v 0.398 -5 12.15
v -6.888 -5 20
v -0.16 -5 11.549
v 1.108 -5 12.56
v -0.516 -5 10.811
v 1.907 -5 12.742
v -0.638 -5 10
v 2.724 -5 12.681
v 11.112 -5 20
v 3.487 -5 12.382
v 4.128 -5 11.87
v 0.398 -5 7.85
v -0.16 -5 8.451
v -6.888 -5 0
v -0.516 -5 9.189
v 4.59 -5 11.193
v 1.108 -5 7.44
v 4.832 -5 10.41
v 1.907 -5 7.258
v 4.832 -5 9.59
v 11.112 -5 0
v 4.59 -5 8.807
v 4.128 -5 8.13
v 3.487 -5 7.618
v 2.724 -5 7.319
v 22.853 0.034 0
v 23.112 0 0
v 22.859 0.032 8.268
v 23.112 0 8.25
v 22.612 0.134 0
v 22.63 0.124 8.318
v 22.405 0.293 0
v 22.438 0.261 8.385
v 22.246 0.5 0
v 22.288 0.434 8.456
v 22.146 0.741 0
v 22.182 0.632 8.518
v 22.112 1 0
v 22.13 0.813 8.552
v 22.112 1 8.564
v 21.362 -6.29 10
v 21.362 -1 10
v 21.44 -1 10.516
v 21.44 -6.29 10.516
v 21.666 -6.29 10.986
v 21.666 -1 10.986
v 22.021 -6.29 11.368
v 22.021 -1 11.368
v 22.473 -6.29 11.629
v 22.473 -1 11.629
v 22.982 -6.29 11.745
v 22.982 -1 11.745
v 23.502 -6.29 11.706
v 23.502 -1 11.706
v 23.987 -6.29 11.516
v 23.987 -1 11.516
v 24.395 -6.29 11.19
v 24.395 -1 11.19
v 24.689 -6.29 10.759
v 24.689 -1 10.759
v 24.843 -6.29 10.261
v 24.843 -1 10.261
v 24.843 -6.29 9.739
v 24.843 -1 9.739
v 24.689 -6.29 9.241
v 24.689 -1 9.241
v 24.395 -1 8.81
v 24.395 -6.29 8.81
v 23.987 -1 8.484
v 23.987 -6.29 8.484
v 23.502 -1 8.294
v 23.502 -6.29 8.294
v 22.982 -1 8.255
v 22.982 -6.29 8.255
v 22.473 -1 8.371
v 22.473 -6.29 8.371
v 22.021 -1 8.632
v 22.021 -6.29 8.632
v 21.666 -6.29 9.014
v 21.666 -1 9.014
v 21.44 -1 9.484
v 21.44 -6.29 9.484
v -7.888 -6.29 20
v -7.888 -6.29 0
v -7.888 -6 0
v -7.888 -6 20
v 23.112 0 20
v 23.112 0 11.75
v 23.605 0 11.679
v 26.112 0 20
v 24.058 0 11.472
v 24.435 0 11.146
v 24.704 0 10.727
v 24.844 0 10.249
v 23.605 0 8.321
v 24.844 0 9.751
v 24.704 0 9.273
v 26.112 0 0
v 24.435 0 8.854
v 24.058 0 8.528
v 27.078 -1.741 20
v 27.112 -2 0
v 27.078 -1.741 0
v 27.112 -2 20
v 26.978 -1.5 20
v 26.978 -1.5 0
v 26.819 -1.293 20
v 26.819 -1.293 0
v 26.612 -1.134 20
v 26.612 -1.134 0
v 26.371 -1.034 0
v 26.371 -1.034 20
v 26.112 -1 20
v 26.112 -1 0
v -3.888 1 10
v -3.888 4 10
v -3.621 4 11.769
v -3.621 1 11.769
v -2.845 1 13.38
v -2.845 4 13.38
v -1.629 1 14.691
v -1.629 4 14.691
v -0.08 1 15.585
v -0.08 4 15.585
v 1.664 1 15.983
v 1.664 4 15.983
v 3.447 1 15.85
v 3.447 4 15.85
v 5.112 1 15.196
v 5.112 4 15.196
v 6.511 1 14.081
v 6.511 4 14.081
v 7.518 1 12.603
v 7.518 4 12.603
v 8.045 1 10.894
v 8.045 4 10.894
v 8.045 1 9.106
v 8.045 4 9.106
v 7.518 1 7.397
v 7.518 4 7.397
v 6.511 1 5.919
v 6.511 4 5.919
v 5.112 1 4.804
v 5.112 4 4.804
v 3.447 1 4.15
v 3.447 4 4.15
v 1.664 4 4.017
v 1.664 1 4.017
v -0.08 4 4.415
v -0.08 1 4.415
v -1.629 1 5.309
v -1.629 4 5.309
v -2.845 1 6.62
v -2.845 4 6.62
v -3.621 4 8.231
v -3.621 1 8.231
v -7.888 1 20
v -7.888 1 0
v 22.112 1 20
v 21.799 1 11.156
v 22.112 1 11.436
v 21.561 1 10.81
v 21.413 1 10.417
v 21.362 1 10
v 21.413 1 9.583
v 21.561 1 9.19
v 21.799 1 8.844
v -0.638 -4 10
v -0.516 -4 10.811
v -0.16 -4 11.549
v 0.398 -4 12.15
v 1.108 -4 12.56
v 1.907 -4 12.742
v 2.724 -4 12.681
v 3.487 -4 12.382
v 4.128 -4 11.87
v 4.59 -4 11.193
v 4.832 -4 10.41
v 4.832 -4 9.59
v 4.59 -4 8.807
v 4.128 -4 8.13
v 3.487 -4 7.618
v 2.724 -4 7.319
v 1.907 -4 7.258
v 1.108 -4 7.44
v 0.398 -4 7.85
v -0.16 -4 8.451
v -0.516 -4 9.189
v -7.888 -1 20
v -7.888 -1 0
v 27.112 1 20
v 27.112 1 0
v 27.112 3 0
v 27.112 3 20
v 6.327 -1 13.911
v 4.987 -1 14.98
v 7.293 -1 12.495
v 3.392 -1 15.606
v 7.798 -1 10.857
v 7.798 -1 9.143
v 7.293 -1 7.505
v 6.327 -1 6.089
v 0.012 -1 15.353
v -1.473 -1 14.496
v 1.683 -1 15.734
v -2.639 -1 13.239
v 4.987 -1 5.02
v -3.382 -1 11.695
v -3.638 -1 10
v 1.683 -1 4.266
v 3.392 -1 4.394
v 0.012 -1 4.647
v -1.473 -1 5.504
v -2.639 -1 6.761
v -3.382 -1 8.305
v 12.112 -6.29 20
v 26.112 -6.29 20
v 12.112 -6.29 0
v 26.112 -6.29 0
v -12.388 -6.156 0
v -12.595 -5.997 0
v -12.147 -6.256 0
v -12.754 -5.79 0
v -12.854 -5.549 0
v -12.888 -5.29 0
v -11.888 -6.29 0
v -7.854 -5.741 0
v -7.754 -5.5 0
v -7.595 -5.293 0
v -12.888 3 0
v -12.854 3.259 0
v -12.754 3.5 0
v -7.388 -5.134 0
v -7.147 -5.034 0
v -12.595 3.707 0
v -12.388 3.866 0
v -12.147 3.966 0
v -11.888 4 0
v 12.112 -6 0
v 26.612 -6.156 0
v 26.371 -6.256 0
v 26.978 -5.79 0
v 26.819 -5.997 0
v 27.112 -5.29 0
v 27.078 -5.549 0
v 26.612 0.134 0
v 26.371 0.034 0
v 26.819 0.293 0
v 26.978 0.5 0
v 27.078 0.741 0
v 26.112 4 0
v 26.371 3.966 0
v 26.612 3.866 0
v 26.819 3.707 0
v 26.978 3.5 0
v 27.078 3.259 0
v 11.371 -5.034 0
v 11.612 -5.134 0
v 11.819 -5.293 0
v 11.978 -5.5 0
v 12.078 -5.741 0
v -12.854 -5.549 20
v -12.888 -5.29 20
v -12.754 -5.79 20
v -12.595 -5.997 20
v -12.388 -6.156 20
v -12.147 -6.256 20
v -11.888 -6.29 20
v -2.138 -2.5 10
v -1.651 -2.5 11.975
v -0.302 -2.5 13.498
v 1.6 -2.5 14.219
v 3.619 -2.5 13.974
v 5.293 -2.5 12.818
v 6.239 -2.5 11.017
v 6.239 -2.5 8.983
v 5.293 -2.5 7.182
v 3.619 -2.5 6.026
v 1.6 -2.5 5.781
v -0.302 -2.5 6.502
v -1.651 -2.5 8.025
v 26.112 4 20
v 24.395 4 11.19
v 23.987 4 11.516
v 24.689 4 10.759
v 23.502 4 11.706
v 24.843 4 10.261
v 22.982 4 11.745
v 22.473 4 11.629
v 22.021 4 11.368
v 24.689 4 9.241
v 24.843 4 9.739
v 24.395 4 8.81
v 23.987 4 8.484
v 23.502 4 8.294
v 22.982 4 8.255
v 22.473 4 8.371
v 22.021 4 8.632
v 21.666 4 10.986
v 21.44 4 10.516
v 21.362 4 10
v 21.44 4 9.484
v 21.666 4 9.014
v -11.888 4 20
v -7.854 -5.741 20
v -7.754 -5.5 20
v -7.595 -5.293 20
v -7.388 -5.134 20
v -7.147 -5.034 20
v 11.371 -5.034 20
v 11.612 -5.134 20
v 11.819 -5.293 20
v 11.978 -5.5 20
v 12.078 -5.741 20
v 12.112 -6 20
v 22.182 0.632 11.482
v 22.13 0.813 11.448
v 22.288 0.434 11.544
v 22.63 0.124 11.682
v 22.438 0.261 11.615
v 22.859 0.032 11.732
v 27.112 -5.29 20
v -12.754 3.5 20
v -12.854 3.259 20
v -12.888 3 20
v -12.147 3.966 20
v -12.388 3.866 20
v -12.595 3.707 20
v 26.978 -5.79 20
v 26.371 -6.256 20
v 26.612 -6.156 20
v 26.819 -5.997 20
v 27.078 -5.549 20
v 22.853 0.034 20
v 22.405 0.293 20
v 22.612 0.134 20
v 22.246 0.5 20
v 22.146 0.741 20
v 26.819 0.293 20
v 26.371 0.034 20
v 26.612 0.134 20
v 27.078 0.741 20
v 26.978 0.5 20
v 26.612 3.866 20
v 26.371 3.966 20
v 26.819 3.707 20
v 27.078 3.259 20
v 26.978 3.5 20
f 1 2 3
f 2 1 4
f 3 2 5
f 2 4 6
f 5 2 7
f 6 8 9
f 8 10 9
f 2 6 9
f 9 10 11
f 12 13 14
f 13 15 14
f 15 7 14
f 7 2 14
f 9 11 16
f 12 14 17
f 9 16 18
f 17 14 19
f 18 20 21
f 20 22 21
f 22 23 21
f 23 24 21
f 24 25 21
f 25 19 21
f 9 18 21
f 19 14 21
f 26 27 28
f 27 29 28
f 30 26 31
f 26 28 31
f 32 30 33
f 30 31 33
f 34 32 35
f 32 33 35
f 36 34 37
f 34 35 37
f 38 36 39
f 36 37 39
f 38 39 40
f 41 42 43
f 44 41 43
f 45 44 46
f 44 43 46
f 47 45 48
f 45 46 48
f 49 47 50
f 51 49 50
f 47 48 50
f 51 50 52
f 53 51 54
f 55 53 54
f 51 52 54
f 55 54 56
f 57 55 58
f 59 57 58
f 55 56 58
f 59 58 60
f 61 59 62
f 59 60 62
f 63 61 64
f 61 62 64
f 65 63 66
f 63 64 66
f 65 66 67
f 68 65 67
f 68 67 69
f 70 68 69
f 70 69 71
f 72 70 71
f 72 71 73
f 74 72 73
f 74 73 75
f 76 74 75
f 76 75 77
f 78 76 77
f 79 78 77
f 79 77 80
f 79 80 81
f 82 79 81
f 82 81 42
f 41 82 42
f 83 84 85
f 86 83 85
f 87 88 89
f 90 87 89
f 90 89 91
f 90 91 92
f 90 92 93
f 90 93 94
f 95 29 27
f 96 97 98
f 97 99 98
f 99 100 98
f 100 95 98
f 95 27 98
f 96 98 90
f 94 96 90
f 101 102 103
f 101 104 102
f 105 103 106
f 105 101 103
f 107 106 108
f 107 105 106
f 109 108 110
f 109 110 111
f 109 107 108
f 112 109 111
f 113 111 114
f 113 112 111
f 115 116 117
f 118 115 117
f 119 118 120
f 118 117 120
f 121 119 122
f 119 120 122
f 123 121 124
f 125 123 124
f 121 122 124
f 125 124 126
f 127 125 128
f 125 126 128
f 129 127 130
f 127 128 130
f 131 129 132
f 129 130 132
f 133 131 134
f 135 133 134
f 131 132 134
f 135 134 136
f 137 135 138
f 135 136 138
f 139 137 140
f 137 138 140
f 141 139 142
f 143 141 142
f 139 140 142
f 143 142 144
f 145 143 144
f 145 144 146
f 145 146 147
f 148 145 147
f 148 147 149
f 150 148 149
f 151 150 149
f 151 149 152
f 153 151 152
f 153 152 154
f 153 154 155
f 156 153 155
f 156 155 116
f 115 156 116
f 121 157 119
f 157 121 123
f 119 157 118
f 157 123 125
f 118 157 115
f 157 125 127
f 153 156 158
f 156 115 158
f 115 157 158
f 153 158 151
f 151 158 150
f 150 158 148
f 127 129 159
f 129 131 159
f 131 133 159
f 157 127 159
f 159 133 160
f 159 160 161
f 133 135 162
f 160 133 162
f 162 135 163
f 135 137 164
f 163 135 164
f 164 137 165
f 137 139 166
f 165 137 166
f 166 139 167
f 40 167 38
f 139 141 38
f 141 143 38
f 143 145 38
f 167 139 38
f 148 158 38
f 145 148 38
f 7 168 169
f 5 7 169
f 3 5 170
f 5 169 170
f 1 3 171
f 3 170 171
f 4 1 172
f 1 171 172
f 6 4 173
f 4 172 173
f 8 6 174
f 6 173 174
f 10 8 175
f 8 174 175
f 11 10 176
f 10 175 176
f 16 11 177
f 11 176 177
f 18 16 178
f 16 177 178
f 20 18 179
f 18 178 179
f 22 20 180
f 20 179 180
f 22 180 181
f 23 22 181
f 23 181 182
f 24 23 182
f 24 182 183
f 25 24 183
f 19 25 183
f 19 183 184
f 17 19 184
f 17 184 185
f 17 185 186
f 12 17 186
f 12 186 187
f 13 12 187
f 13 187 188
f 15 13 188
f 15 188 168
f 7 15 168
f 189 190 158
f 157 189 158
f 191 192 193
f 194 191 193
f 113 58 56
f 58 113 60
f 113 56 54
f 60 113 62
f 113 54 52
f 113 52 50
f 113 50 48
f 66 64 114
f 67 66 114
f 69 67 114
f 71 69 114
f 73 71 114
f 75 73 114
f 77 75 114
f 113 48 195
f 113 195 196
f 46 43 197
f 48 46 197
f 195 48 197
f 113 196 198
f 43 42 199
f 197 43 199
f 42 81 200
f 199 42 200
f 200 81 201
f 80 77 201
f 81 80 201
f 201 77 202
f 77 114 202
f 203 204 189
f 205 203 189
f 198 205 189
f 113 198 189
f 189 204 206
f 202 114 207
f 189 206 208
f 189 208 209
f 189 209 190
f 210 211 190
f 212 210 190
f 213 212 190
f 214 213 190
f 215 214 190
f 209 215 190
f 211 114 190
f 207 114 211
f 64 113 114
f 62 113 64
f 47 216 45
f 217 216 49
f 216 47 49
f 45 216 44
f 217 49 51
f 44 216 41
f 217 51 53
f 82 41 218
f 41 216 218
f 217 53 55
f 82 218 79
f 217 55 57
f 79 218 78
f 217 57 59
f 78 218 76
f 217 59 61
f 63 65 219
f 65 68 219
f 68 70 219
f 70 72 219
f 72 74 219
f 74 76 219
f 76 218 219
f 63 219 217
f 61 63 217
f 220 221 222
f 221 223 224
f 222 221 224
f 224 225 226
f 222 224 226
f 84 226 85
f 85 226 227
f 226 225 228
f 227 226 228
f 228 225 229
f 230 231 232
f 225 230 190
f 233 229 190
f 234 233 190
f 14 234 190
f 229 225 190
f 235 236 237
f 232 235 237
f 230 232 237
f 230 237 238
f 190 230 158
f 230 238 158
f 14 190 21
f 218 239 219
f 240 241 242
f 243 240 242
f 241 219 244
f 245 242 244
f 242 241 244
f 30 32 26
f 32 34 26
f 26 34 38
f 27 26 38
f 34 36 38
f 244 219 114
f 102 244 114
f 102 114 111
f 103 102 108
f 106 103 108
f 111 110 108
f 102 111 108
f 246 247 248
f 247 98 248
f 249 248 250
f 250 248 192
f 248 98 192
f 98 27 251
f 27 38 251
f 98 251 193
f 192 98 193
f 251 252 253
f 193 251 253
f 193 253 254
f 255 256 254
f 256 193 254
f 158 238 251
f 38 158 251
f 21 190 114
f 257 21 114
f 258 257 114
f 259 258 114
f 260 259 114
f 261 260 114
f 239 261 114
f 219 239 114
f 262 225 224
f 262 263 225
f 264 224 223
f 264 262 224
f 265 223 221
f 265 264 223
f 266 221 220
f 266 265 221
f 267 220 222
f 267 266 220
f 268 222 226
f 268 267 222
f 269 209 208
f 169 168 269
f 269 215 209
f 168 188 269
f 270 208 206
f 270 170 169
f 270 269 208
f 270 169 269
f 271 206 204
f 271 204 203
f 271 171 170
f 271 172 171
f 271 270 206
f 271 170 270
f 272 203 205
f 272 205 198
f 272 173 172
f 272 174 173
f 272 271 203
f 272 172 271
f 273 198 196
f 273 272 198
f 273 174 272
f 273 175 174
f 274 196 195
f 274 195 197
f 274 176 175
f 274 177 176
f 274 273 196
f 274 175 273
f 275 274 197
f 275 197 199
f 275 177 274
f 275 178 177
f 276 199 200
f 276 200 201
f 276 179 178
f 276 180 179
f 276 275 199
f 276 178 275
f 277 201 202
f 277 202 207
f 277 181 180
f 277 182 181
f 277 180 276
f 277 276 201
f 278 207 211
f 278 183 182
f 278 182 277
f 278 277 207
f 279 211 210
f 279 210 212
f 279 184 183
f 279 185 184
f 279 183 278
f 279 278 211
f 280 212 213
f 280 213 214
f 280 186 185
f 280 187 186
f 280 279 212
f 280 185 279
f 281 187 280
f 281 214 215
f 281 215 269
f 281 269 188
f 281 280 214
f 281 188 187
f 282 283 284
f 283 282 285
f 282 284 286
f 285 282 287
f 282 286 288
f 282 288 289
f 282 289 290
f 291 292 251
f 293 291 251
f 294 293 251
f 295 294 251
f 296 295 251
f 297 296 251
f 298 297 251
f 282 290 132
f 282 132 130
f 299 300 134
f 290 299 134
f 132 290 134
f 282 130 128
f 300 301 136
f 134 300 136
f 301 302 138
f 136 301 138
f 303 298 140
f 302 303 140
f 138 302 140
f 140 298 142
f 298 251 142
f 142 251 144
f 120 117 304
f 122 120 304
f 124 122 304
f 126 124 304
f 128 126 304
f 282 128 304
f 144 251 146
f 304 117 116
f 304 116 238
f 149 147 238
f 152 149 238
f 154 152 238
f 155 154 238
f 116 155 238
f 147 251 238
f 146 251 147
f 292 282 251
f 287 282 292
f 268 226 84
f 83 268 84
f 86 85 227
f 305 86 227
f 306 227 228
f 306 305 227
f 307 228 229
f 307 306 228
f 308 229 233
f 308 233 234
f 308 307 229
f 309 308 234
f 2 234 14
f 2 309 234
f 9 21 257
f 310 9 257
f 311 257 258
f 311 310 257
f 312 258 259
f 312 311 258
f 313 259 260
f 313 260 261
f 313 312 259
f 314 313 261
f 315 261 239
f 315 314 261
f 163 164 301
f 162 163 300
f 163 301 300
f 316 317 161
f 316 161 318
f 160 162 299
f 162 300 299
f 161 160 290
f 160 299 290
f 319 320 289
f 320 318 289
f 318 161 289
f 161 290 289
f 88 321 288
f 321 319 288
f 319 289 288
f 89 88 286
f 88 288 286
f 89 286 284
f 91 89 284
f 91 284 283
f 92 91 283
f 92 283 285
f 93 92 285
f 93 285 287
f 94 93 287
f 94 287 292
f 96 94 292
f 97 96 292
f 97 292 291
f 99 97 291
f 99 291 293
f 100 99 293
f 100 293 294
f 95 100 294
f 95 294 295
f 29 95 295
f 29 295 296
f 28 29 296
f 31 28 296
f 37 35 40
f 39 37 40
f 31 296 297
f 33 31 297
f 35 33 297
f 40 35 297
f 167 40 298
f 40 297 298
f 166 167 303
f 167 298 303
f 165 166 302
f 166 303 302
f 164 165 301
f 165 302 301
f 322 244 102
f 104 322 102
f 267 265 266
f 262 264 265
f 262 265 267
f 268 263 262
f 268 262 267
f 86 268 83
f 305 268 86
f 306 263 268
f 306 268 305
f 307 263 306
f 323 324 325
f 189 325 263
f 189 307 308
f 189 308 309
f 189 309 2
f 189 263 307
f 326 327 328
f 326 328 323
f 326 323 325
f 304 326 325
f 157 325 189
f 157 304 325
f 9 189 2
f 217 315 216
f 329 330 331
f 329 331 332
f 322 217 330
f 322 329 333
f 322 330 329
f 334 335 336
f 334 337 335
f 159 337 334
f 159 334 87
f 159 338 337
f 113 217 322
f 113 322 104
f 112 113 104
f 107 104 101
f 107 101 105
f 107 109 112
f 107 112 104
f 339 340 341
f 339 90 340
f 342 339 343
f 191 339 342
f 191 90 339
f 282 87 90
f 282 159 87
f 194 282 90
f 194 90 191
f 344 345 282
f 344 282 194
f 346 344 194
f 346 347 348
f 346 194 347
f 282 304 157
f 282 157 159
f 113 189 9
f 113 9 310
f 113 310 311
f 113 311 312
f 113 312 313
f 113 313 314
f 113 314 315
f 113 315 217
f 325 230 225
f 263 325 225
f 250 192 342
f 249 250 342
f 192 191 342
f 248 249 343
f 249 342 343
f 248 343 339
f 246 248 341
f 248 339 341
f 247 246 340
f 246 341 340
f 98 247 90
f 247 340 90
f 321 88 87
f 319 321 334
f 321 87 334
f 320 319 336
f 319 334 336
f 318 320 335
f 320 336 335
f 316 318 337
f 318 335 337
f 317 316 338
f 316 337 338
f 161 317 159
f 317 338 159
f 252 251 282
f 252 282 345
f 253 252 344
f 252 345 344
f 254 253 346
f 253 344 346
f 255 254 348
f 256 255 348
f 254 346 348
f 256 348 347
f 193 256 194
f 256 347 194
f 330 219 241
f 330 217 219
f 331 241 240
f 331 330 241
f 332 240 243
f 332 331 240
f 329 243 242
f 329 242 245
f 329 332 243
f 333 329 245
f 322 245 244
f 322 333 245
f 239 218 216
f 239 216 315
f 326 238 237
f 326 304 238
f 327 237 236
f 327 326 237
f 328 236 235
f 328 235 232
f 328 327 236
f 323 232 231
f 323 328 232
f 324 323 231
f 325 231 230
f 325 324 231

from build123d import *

# Parameters (mm, degrees)
F0_W     = 5
F0_H     = 2
F0_H_2   = 1.2903230384
F0_W_2   = 15
F0_H_3   = 1
F1_DEPTH = 20
F2_R     = 2.75
F2_R_2   = 1.75
F3_DEPTH = 25
F4_R     = 0.99999
F5_R     = 6
F5_R_2   = 2.75
F6_DEPTH = 5
F7_SIZE  = 3


# Not quite as in the source:
# - a fillet or chamfer is up to 0.001 mm smaller than in the source, because OpenCascade refuses the exact size


with BuildPart() as f1:
    # F0 (on Top) → F1 (new body)
    with BuildSketch(Plane.XY):
        Polygon((27.1122940337, 4), (-12.8877059663, 4), (-12.8877059663, 1), (-7.8877059663, 1), (22.1122940337, 1), (27.1122940337, 1), align=None)
        with Locations((-10.3877059663, 0)):
            Rectangle(F0_W, F0_H)
        Polygon((-7.8877059663, -1), (-12.8877059663, -1), (-12.8877059663, -5), (-7.8877059663, -5), (12.1122940337, -5), (27.1122940337, -5), (27.1122940337, -1), align=None)
        with Locations((-10.3877059663, -5.6451615192)):
            Rectangle(F0_W, F0_H_2)
        with Locations((19.6122940337, -5.6451615192)):
            Rectangle(F0_W_2, F0_H_2)
        with Locations((24.6122940337, 0.5)):
            Rectangle(F0_W, F0_H_3)
    extrude(amount=F1_DEPTH)

    # F2 (on face) → F3 (cut)
    with BuildSketch(Plane(origin=(0, 4, 0), x_dir=(-1, 0, 0), z_dir=(0, 1, 0))):
        with Locations((-2.1122940337, 10)):
            Circle(F2_R)
        with Locations((-23.1122940337, 10)):
            Circle(F2_R_2)
    extrude(amount=-F3_DEPTH, mode=Mode.SUBTRACT)

    # F4 (radius 1 in the source; OpenCascade refuses exactly that, so slightly less here)
    f4_edges = [f1.edges().sort_by_distance(p)[0] for p in [
        (-7.887706, -5, 10),
        (12.112294, -5, 10),
        (-12.887706, -6.290323, 10),
        (27.112294, -6.290323, 10),
        (27.112294, -1, 10),
        (27.112294, 0, 10),
        (27.112294, 4, 10),
        (-12.887706, 4, 10),
        (22.112294, 0, 15.71807),
        (22.112294, 0, 4.28193),
    ]]
    fillet(f4_edges, radius=F4_R)

    # F5 (on face) → F6 (cut)
    with BuildSketch(Plane(origin=(0, 4, 0), x_dir=(-1, 0, 0), z_dir=(0, 1, 0))):
        with Locations((-2.1122940337, 10)):
            Circle(F5_R)
        with Locations((-2.1122940337, 10)):
            Circle(F5_R_2, mode=Mode.SUBTRACT)
    extrude(amount=-F6_DEPTH, mode=Mode.SUBTRACT)

    # F7
    f7_edges = [f1.edges().sort_by_distance(p)[0] for p in [
        (4.862294, -1, 10),
    ]]
    chamfer(f7_edges, length=F7_SIZE)


solid = f1.part
